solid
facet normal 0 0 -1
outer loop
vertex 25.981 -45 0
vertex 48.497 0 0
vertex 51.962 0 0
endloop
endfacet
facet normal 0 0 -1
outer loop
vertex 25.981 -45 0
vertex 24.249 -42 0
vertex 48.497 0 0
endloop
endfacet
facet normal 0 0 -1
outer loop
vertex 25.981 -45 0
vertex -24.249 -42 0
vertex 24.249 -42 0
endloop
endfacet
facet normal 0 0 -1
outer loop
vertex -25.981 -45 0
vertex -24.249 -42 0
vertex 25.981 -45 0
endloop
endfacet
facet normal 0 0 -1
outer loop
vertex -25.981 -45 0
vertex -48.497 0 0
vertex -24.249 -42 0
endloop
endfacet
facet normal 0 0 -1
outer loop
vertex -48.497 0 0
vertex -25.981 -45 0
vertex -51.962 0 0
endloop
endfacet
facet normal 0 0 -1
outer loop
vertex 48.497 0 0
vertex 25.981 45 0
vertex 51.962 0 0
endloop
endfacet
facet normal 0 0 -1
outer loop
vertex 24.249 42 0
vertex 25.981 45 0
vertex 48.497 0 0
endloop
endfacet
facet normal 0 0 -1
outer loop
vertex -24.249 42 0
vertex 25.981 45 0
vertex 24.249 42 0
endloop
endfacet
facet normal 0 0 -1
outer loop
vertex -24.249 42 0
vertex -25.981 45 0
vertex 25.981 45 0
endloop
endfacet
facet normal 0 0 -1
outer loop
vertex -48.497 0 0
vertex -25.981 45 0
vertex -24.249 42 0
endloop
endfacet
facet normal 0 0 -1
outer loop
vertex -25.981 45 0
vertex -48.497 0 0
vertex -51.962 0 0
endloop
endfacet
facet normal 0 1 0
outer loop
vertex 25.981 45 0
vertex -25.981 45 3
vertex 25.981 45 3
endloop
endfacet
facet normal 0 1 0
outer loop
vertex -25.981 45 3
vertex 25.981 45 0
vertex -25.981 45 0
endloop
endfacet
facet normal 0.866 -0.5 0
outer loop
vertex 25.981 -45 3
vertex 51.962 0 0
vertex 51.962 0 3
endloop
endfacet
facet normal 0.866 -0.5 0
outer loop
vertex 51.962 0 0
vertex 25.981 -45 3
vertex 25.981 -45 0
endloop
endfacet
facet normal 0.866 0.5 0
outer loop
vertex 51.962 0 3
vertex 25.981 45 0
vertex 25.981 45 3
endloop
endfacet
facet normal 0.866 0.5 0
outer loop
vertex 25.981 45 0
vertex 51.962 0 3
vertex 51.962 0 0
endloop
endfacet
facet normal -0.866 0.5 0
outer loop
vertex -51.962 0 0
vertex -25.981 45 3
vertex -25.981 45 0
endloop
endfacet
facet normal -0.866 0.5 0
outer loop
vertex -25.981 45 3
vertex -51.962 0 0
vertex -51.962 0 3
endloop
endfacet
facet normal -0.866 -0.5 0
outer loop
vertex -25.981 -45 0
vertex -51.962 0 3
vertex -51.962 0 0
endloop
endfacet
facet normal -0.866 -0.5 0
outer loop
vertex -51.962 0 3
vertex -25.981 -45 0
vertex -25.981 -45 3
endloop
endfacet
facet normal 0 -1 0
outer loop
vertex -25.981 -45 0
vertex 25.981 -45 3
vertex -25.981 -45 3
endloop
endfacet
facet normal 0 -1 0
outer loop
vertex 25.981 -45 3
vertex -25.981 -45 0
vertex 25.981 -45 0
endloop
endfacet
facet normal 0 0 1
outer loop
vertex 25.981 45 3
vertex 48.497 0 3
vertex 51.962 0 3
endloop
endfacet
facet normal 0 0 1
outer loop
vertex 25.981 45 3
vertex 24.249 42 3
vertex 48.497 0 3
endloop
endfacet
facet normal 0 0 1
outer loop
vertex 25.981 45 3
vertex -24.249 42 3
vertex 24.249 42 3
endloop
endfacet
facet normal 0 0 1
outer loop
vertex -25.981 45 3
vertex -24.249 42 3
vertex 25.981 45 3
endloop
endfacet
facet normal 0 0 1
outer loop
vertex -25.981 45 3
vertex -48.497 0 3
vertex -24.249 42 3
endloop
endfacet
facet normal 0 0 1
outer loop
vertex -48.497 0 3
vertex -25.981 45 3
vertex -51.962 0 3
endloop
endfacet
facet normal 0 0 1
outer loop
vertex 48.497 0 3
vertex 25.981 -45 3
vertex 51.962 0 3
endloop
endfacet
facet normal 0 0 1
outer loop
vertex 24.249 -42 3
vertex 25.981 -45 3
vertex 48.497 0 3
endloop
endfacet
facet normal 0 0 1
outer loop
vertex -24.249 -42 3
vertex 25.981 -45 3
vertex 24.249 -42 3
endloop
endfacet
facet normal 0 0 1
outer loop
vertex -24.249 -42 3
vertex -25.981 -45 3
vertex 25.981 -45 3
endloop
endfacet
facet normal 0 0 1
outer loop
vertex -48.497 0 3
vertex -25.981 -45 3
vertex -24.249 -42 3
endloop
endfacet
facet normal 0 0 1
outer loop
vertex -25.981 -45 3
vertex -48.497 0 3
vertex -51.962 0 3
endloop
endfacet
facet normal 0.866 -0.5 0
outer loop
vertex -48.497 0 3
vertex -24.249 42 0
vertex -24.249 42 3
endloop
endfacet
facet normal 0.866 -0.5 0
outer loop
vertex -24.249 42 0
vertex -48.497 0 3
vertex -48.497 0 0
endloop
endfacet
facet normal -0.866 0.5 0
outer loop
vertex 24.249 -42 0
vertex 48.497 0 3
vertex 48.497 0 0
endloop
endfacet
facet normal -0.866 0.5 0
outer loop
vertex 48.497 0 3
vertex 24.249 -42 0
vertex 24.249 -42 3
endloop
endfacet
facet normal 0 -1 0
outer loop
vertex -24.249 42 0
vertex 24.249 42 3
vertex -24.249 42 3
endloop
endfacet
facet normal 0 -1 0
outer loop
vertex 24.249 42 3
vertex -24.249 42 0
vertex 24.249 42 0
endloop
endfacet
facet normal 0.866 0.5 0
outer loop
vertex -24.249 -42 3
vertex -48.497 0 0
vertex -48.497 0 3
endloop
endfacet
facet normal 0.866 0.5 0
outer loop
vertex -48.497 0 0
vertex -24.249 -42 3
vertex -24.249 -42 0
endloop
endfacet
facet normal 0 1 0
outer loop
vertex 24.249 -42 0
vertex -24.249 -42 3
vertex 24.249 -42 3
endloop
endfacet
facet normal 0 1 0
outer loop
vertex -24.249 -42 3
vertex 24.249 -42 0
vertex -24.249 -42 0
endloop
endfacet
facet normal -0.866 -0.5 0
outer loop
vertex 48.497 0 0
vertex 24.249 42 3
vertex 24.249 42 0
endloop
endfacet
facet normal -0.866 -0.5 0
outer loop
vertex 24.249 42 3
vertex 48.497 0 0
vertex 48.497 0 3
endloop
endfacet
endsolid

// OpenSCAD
// Float for 7 x 15 mL conical tubes, printed upside down (plate on bed, z=0..3)
$fn = 64;

// Plate (regular hexagon, 90 mm across flats, two flats parallel to X)
plate_af   = 90;   // across flats
plate_t    = 3;    // plate thickness (z 0..3)
plate_ap   = plate_af / 2;   // apothem = 45
plate_r    = plate_af / sqrt(3); // circumradius = 51.9615

// Holes: 17.5 mm through, 1 centre + 6 on 54 mm dia circle (first on +X)
hole_d     = 17.5;
hole_r     = hole_d / 2;   // 8.75
ring_d     = 54;
ring_r     = ring_d / 2;   // 27

// Sleeves: 2 mm wall -> 21.5 mm OD, rise to z=20
sleeve_od  = 21.5;
sleeve_r   = sleeve_od / 2; // 10.75
sleeve_h   = 20;

// Hexagonal skirt: 2 mm wall, 84 mm across flats outside (3 mm in from plate edge)
skirt_af   = 84;
skirt_ap   = skirt_af / 2;  // 42
skirt_r    = skirt_af / sqrt(3); // 48.4973
skirt_h    = 20;

// Helper: regular hexagon polygon (flat sides parallel to X, vertices at 0,60,...)
module hexagon(r) {
    polygon(points = [for (i = [0:5]) [r * cos(i * 60), r * sin(i * 60)]]);
}

// Hole centre positions (centre + 6 on 54 mm dia circle, first on +X)
hole_pos = [
    [0, 0],
    [ring_r, 0],
    [ring_r * cos(60),  ring_r * sin(60)],
    [ring_r * cos(120), ring_r * sin(120)],
    [ring_r * cos(180), ring_r * sin(180)],
    [ring_r * cos(240), ring_r * sin(240)],
    [ring_r * cos(300), ring_r * sin(300)]
];

// Cuts: each extends 1 mm past the faces it cuts (z -1 .. 21)
module hole_cut() {
    translate([0, 0, -1])
        cylinder(h = 22, r = hole_r, $fn = 64);
}

module sleeve_cut() {
    translate([0, 0, -1])
        cylinder(h = 22, r = sleeve_r, $fn = 64);
}

module skirt_cut() {
    translate([0, 0, -1])
        linear_extrude(height = 22)
            hexagon(skirt_r);
}

// Base solid: plate + 7 sleeves + hexagonal skirt (all rising to z=20)
module base_solid() {
    union() {
        // Plate: z 0..3
        translate([0, 0, 0])
            linear_extrude(height = plate_t)
                hexagon(plate_r);

        // Sleeves: z 0..20 at each hole centre
        for (p = hole_pos)
            translate([p[0], p[1], 0])
                cylinder(h = sleeve_h, r = sleeve_r, $fn = 64);

        // Hexagonal skirt: z 0..20, sides parallel to plate
        translate([0, 0, 0])
            linear_extrude(height = skirt_h)
                hexagon(skirt_r);
    }
}

// Final float: base solid minus all cuts
difference() {
    base_solid();

    // 7 through-holes (17.5 mm)
    for (p = hole_pos)
        translate([p[0], p[1], 0])
            hole_cut();

    // 7 sleeve bores (21.5 mm)
    for (p = hole_pos)
        translate([p[0], p[1], 0])
            sleeve_cut();

    // Hexagonal skirt bore (84 mm across flats)
    skirt_cut();
}
